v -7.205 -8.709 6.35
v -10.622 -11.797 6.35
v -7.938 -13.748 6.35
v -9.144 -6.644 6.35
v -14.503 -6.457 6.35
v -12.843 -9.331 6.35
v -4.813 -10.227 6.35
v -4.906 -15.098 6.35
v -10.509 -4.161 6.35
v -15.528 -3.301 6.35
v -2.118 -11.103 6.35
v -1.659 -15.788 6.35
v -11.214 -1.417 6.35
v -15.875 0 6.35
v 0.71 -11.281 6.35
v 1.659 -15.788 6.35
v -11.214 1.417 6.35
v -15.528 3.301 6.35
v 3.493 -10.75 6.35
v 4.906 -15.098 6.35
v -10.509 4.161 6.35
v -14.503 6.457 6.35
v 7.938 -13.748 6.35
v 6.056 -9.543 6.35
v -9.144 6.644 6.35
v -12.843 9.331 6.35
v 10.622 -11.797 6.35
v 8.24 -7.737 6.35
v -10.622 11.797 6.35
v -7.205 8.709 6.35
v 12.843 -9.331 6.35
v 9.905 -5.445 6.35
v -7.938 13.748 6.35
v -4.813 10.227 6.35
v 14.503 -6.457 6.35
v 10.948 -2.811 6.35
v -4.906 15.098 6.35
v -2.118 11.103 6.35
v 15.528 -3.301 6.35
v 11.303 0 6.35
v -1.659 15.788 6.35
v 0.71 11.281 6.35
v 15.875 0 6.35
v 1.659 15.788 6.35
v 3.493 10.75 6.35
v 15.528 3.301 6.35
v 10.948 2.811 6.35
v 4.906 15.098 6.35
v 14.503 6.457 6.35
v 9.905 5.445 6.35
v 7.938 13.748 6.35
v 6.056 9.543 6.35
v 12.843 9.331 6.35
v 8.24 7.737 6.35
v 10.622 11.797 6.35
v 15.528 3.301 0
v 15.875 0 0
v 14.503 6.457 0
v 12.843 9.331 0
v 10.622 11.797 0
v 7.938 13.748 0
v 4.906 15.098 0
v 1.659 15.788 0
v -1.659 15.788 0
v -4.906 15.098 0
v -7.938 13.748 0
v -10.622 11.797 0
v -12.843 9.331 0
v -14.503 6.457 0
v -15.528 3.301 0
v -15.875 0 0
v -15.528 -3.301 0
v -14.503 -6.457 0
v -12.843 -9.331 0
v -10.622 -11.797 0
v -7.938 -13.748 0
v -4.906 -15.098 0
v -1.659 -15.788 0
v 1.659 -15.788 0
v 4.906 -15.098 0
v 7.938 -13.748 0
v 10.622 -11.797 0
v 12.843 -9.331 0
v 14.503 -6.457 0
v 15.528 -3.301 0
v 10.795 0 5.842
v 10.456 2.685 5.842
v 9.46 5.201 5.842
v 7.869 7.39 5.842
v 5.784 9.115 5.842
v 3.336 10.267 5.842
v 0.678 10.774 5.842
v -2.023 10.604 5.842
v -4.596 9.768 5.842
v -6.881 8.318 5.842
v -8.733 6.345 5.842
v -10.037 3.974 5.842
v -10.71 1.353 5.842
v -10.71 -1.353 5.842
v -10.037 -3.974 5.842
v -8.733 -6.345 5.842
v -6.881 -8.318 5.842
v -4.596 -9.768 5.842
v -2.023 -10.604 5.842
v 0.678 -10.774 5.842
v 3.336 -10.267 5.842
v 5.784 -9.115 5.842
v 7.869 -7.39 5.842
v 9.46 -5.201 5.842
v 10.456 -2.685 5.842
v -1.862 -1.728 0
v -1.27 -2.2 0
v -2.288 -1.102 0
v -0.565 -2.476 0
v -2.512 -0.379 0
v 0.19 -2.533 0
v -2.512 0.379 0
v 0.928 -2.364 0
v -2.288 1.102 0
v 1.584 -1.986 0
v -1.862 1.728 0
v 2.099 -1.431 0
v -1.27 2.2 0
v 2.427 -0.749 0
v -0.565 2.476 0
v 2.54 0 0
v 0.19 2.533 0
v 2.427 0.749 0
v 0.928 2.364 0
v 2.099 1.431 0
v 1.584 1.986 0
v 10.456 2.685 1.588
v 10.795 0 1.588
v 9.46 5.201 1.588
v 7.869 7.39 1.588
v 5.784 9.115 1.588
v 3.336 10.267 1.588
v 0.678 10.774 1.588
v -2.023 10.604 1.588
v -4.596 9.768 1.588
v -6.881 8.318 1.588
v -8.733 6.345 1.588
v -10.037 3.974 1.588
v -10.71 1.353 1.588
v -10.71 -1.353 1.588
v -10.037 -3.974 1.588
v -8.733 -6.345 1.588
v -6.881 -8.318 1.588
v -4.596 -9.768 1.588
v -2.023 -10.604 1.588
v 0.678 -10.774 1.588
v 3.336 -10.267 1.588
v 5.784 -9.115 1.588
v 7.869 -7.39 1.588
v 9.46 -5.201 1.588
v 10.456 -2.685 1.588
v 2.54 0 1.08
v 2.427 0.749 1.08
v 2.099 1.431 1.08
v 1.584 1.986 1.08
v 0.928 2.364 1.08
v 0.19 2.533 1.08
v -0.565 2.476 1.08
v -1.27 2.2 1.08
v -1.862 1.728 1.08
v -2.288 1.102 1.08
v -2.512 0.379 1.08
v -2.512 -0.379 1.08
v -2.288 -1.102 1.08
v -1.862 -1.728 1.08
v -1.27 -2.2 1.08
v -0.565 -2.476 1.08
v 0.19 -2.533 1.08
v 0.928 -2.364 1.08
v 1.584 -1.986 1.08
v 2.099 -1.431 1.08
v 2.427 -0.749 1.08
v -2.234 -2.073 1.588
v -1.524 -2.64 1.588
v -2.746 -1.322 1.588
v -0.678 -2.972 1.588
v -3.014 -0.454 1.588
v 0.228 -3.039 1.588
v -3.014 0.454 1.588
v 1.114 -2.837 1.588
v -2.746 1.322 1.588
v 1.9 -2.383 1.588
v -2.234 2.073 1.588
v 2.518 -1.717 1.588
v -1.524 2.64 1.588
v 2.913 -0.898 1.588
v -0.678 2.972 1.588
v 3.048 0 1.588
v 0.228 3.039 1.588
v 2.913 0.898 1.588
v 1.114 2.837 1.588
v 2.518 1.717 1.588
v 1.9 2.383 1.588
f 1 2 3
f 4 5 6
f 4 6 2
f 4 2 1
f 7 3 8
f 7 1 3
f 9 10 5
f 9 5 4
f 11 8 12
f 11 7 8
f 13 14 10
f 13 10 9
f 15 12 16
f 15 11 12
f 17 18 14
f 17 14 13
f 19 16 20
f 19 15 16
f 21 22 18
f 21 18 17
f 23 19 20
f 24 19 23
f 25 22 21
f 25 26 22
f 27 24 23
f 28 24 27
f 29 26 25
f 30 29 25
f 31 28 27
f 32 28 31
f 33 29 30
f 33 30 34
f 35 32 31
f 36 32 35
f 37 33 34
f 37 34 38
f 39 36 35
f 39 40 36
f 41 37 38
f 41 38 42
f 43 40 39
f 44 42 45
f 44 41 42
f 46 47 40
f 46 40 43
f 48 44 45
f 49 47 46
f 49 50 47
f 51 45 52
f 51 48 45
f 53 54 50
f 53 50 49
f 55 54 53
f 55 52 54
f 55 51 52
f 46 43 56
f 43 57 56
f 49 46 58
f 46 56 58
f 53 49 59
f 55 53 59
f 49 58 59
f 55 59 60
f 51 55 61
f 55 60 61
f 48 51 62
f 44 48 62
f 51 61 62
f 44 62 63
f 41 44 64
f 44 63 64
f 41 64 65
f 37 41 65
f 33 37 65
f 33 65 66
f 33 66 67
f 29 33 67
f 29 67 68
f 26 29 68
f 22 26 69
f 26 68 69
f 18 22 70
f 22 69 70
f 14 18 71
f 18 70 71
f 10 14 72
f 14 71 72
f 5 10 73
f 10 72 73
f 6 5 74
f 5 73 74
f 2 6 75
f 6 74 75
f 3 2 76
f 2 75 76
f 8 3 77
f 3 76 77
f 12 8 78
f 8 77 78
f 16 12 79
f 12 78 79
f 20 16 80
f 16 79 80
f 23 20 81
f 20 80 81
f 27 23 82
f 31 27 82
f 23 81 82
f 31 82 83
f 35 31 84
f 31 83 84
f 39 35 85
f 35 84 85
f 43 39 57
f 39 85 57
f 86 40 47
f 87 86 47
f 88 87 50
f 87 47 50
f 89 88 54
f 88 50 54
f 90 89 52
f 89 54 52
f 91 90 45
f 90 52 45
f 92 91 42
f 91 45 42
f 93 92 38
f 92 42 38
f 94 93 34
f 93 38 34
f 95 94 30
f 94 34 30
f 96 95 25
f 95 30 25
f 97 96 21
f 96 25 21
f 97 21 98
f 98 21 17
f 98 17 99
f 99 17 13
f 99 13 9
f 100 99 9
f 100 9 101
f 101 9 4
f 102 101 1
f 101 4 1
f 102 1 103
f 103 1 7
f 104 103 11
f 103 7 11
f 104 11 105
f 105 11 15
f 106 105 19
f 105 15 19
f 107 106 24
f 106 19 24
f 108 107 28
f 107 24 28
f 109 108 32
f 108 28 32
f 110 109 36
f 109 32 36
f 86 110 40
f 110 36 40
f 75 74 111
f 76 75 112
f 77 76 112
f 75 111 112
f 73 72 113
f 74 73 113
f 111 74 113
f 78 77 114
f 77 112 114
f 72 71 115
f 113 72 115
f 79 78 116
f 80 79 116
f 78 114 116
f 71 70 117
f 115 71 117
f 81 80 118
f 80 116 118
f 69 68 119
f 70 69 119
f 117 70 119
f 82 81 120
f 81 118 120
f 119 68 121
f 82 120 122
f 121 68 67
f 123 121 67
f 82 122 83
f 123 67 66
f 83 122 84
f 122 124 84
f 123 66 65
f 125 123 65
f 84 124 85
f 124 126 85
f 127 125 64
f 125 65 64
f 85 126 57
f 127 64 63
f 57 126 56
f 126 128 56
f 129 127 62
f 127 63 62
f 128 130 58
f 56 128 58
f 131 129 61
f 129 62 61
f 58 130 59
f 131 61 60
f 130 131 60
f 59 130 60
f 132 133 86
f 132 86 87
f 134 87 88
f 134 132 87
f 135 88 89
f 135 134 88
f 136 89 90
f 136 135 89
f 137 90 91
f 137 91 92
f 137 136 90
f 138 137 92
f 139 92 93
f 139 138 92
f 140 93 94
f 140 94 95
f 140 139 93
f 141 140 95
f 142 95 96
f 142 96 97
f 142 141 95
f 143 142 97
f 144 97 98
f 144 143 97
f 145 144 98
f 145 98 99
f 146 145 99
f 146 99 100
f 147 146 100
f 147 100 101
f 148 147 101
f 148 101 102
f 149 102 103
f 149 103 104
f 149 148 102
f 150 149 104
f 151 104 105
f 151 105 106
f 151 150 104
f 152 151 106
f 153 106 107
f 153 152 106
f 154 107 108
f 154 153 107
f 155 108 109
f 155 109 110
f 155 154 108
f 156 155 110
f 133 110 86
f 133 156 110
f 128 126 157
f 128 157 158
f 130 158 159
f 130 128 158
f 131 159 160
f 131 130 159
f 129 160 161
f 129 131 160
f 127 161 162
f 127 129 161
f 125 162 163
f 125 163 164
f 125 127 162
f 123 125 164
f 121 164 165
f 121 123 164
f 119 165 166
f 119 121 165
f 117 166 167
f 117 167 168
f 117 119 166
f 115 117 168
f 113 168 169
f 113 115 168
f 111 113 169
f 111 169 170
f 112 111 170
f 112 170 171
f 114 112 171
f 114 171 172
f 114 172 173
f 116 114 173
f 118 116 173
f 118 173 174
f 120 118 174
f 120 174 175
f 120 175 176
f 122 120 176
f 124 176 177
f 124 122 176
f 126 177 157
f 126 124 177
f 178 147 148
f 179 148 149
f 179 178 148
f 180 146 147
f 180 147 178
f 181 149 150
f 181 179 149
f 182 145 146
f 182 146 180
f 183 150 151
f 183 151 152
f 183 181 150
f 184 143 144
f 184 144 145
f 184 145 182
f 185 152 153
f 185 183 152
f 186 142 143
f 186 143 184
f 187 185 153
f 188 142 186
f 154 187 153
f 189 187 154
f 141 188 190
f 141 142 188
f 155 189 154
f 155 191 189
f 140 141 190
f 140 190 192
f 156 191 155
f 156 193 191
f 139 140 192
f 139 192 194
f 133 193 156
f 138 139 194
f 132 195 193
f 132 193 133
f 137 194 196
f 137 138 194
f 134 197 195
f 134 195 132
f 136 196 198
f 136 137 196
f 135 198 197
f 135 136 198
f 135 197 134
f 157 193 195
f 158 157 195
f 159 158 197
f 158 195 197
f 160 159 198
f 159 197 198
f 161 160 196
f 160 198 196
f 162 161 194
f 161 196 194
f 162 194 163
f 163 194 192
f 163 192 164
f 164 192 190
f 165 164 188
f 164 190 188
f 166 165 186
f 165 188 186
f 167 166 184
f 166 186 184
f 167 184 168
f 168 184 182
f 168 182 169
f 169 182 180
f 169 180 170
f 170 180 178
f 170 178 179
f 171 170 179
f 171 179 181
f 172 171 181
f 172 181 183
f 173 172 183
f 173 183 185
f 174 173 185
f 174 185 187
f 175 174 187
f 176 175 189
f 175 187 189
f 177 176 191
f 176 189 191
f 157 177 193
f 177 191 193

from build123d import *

# Parameters (mm, degrees)
F0_R     = 15.875
F0_R_2   = 2.54
F1_DEPTH = 1.5875
F2_R     = 15.875
F2_R_2   = 10.795
F3_DEPTH = 4.7625
F4_SIZE  = 0.508


with BuildPart() as f1:
    # F0 (on Top) → F1 (new body)
    with BuildSketch(Plane.XY):
        Circle(F0_R)
        Circle(F0_R_2, mode=Mode.SUBTRACT)
    extrude(amount=F1_DEPTH)

    # F2 (on face) → F3 (join)
    with BuildSketch(Plane.XY.offset(1.5875)):
        Circle(F2_R)
        Circle(F2_R_2, mode=Mode.SUBTRACT)
    extrude(amount=F3_DEPTH)

    # F4
    f4_edges = [f1.edges().sort_by_distance(p)[0] for p in [
        (-10.795, 0, 6.35),
        (-2.54, 0, 1.5875),
    ]]
    chamfer(f4_edges, length=F4_SIZE)


solid = f1.part
